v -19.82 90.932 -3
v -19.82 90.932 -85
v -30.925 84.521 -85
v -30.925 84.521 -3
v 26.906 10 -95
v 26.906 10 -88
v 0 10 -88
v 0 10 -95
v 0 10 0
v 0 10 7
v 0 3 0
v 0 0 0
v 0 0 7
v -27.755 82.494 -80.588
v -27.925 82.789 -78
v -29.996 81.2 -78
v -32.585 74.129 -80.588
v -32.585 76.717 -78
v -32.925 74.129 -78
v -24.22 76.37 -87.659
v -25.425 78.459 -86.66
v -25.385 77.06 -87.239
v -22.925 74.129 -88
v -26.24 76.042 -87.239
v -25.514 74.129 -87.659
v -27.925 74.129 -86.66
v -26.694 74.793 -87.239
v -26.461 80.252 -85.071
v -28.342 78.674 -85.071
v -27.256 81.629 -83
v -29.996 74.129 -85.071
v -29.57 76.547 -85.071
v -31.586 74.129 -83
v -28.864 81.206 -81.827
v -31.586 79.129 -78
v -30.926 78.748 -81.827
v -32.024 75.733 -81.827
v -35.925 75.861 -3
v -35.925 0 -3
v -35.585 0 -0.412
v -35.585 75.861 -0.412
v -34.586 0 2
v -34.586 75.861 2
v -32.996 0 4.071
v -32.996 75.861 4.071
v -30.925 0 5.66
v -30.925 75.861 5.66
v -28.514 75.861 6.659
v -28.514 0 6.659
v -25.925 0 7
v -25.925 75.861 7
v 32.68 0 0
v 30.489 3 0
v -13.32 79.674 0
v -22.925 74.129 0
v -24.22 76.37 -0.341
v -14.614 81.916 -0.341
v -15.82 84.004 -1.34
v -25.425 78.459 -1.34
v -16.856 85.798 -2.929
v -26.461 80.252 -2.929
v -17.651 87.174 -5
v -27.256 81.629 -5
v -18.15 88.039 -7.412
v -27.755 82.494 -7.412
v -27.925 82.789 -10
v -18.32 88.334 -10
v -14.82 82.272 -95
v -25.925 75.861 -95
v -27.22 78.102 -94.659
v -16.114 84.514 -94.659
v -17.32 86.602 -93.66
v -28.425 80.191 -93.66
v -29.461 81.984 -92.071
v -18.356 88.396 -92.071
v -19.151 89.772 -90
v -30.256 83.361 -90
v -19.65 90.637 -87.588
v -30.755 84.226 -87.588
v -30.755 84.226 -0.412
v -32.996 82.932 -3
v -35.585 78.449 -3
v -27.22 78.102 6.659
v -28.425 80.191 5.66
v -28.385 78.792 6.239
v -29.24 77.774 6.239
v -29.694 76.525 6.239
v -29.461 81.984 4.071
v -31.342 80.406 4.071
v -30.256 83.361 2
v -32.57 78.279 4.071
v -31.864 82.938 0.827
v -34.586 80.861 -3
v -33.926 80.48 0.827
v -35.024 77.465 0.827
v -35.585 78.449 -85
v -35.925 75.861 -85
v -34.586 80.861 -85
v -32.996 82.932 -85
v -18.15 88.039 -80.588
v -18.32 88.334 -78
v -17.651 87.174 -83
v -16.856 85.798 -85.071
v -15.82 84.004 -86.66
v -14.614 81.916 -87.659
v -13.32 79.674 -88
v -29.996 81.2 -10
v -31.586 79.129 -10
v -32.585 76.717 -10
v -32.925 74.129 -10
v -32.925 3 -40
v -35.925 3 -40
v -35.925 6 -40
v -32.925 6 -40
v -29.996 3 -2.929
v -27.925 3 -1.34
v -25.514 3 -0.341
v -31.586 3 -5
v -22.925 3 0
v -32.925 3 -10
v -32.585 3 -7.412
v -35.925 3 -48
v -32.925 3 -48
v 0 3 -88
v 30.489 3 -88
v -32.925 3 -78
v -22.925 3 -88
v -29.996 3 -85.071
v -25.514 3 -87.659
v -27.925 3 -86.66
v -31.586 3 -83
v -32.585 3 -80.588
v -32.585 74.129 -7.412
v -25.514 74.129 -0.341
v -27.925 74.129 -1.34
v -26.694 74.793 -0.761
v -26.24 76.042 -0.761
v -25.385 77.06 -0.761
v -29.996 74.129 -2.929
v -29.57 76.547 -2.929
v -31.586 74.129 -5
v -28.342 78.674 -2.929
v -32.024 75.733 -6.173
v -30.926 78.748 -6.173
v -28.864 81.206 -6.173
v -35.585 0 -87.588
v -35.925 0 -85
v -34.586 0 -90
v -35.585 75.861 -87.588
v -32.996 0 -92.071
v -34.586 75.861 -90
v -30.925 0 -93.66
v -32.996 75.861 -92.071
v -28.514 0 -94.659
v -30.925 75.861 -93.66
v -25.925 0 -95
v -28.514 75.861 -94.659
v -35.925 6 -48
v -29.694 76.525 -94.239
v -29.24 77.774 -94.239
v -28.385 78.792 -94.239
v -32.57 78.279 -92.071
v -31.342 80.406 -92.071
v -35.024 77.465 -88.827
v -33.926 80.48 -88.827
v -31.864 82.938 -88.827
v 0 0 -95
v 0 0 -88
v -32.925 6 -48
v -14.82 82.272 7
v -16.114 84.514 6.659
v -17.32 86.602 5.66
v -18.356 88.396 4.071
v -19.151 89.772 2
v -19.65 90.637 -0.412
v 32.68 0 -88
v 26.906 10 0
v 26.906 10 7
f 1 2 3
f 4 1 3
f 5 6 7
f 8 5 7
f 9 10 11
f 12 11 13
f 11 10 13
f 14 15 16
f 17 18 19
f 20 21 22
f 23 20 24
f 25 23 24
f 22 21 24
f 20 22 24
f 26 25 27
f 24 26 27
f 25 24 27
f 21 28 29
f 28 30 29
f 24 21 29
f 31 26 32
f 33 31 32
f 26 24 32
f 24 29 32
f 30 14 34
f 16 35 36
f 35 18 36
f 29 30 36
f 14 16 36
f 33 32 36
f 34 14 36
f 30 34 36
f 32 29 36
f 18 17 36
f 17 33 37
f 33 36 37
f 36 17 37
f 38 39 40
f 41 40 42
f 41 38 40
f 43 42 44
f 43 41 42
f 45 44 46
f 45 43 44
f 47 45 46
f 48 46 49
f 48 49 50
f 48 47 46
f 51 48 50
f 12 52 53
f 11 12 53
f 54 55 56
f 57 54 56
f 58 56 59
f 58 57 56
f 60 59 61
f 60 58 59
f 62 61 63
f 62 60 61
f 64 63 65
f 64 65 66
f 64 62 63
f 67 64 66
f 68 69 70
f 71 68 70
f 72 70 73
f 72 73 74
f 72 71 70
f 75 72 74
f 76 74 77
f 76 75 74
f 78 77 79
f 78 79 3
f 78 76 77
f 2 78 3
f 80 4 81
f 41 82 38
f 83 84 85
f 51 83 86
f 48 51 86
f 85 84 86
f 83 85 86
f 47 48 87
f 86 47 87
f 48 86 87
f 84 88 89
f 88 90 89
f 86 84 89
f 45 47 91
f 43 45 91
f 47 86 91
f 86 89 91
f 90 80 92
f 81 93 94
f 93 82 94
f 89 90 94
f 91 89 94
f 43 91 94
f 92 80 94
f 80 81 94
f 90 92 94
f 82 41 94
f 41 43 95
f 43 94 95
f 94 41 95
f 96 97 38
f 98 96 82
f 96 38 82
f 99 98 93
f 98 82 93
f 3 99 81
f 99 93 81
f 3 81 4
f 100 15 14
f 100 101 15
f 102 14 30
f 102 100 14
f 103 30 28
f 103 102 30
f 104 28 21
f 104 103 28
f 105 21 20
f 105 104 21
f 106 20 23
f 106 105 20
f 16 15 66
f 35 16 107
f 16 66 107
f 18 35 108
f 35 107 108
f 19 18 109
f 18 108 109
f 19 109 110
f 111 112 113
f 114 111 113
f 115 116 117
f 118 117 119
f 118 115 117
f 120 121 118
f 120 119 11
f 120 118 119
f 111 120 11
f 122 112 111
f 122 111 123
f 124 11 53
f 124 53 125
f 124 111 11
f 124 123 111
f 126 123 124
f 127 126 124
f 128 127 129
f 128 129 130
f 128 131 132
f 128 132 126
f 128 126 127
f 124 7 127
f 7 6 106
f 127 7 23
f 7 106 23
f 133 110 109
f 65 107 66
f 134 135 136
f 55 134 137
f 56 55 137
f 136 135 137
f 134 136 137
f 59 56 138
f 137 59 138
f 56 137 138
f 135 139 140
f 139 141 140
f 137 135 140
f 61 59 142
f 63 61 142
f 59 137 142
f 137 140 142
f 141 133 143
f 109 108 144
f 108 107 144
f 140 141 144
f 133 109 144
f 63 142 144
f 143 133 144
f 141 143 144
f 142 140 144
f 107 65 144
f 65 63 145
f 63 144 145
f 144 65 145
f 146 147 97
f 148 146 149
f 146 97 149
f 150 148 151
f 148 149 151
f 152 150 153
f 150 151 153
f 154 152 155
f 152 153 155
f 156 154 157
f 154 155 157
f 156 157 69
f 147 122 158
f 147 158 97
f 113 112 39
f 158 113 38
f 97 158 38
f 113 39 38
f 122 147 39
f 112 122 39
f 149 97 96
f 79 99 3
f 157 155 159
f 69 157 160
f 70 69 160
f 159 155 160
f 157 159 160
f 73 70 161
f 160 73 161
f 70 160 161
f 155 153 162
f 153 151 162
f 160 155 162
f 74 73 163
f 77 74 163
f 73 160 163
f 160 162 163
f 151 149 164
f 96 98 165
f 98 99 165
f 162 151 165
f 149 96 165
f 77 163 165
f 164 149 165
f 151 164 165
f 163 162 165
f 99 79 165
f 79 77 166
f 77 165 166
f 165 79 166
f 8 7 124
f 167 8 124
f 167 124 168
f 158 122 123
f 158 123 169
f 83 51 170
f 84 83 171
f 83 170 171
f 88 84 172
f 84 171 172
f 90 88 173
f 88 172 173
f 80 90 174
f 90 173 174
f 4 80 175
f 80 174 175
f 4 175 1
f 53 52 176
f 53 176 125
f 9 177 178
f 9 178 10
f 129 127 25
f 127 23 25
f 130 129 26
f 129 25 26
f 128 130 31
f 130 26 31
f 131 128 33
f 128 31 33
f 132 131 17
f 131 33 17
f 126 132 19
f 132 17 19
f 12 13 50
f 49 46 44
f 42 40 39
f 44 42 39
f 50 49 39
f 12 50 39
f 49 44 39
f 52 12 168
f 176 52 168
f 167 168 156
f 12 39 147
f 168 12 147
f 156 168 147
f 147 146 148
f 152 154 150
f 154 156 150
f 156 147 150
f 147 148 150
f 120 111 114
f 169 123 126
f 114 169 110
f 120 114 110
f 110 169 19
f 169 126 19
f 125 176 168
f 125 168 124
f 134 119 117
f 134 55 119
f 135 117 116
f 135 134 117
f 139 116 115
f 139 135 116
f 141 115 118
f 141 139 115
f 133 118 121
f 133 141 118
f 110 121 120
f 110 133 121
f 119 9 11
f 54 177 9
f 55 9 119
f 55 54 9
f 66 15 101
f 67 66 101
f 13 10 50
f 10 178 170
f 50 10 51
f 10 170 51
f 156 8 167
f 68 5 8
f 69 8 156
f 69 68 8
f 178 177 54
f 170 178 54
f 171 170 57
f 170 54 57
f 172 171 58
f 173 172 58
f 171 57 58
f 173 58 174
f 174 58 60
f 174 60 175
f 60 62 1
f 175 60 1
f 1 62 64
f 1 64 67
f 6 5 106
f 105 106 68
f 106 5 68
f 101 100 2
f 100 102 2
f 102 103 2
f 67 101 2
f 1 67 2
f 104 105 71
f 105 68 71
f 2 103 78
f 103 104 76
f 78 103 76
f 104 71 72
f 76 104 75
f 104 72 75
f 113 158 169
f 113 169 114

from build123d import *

# Parameters (mm, degrees)
AUFSATZ_LINEAR_AUSTRAGEN1_DEPTH = 7
SKIZZE2_W                       = 35.92542340335845
SKIZZE2_H                       = 3
AUFSATZ_LINEAR_AUSTRAGEN2_DEPTH = 44
SKIZZE4_W                       = 35.92542340335845
SKIZZE4_H                       = 3
AUFSATZ_LINEAR_AUSTRAGEN3_DEPTH = 7
SKIZZE6_W                       = 88
SKIZZE6_H                       = 3
AUFSATZ_LINEAR_AUSTRAGEN4_DEPTH = 32.68
AUFSATZ_LINEAR_AUSTRAGEN5_DEPTH = 88
SKIZZE8_W                       = 8
SKIZZE8_H                       = 3.0000000000000004
SCHNITT_LINEAR_AUSTRAGEN1_DEPTH = 3
VERRUNDUNG1_R                   = 10
VERRUNDUNG2_R                   = 10
SCHNITT_LINEAR_AUSTRAGEN2_DEPTH = 137.3244146724952


with BuildPart() as part:
    # Skizze1 → Aufsatz-Linear austragen1 (new body)
    with BuildSketch(Plane.XY):
        Polygon((-35.925423403358465, 81.63419686002398), (-19.820381056767047, 90.93244739413896), (26.90598923241485, 10.000000000000005), (0, 10.000000000000002), (0, 0), (-35.92542340335845, -4.4e-15), align=None)
    extrude(amount=AUFSATZ_LINEAR_AUSTRAGEN1_DEPTH)

    # Skizze2 → Aufsatz-Linear austragen2 (add)
    with BuildSketch(Plane(origin=(0, 0, 0), x_dir=(-1, 0, 0), z_dir=(0, 0, -1))):
        with Locations((17.962711701679225, 1.5)):
            Rectangle(SKIZZE2_W, SKIZZE2_H)
    aufsatz_linear_austragen2 = extrude(amount=AUFSATZ_LINEAR_AUSTRAGEN2_DEPTH)

    # Spiegeln3: Aufsatz-Linear austragen2 across plane
    add(aufsatz_linear_austragen2.mirror(Plane(origin=(0, 0, -44), x_dir=(1, 0, 0), z_dir=(0, 0, -1))))

    # Skizze4 → Aufsatz-Linear austragen3 (add)
    with BuildSketch(Plane(origin=(0, 0, -88), x_dir=(-1, 0, 0), z_dir=(0, 0, -1))):
        Polygon((-26.905989232414854, 10.000000000000005), (0, 10.000000000000002), (0, 3), (35.92542340335845, 3), (35.925423403358465, 81.63419686002398), (19.820381056767047, 90.93244739413895), align=None)
        with Locations((17.962711701679225, 1.5)):
            Rectangle(SKIZZE4_W, SKIZZE4_H)
    extrude(amount=AUFSATZ_LINEAR_AUSTRAGEN3_DEPTH)

    # Skizze6 → Aufsatz-Linear austragen4 (add)
    with BuildSketch(Plane(origin=(0, 0, 0), x_dir=(0, 0, -1), z_dir=(1, 0, 0))):
        with Locations((44, 1.5)):
            Rectangle(SKIZZE6_W, SKIZZE6_H)
    extrude(amount=AUFSATZ_LINEAR_AUSTRAGEN4_DEPTH)

    # Skizze7 → Aufsatz-Linear austragen5 (add)
    with BuildSketch(Plane.XY.offset(-88)):
        Polygon((-35.92542340335845, 3), (-32.92542340335845, 3), (-32.92542340335845, 79.9021460524551), (-35.925423403358465, 78.17009524488621), align=None)
        Polygon((-35.925423403358465, 78.17009524488621), (-32.92542340335845, 79.9021460524551), (-32.92542340335845, 83.36624766759286), (-35.925423403358465, 81.63419686002398), align=None)
        Polygon((-32.92542340335845, 83.36624766759286), (-32.92542340335845, 79.9021460524551), (-18.32038105676701, 88.33437118278556), (-19.82038105676704, 90.93244739413895), align=None)
    extrude(amount=AUFSATZ_LINEAR_AUSTRAGEN5_DEPTH)

    # Skizze8 → Schnitt-Linear austragen1 (cut)
    with BuildSketch(Plane.ZY.offset(35.92542340335845)):
        with Locations((-43.99999999999999, 4.500000000000002)):
            Rectangle(SKIZZE8_W, SKIZZE8_H)
    extrude(amount=-SCHNITT_LINEAR_AUSTRAGEN1_DEPTH, mode=Mode.SUBTRACT)

    # Verrundung1
    verrundung1_edges = [part.edges().sort_by_distance(p)[0] for p in [
        (-35.92542340335846, 40.81709843001198, 7),
        (-35.925423403358465, 81.63419686002398, -44),
        (-27.872902230062756, 86.28332212708148, 7),
        (-35.92542340335846, 40.81709843001199, -95),
        (-27.872902230062756, 86.28332212708146, -95),
    ]]
    fillet(verrundung1_edges, radius=VERRUNDUNG1_R)

    # Verrundung2
    verrundung2_edges = [part.edges().sort_by_distance(p)[0] for p in [
        (-32.92542340335845, 41.45107302622755, -88),
        (-32.92542340335845, 79.9021460524551, -44),
        (-25.622902230062728, 84.11825861762033, -88),
        (-32.92542340335845, 41.45107302622755, 0),
        (-25.622902230062728, 84.11825861762033, 0),
    ]]
    fillet(verrundung2_edges, radius=VERRUNDUNG2_R)

    # Skizze9 → Schnitt-Linear austragen2 (cut, through all)
    with BuildSketch(Plane.XY):
        Polygon((32.68, 0), (30.488543123002803, 3), (32.68, 3), align=None)
    extrude(amount=-SCHNITT_LINEAR_AUSTRAGEN2_DEPTH, mode=Mode.SUBTRACT)


solid = part.part
